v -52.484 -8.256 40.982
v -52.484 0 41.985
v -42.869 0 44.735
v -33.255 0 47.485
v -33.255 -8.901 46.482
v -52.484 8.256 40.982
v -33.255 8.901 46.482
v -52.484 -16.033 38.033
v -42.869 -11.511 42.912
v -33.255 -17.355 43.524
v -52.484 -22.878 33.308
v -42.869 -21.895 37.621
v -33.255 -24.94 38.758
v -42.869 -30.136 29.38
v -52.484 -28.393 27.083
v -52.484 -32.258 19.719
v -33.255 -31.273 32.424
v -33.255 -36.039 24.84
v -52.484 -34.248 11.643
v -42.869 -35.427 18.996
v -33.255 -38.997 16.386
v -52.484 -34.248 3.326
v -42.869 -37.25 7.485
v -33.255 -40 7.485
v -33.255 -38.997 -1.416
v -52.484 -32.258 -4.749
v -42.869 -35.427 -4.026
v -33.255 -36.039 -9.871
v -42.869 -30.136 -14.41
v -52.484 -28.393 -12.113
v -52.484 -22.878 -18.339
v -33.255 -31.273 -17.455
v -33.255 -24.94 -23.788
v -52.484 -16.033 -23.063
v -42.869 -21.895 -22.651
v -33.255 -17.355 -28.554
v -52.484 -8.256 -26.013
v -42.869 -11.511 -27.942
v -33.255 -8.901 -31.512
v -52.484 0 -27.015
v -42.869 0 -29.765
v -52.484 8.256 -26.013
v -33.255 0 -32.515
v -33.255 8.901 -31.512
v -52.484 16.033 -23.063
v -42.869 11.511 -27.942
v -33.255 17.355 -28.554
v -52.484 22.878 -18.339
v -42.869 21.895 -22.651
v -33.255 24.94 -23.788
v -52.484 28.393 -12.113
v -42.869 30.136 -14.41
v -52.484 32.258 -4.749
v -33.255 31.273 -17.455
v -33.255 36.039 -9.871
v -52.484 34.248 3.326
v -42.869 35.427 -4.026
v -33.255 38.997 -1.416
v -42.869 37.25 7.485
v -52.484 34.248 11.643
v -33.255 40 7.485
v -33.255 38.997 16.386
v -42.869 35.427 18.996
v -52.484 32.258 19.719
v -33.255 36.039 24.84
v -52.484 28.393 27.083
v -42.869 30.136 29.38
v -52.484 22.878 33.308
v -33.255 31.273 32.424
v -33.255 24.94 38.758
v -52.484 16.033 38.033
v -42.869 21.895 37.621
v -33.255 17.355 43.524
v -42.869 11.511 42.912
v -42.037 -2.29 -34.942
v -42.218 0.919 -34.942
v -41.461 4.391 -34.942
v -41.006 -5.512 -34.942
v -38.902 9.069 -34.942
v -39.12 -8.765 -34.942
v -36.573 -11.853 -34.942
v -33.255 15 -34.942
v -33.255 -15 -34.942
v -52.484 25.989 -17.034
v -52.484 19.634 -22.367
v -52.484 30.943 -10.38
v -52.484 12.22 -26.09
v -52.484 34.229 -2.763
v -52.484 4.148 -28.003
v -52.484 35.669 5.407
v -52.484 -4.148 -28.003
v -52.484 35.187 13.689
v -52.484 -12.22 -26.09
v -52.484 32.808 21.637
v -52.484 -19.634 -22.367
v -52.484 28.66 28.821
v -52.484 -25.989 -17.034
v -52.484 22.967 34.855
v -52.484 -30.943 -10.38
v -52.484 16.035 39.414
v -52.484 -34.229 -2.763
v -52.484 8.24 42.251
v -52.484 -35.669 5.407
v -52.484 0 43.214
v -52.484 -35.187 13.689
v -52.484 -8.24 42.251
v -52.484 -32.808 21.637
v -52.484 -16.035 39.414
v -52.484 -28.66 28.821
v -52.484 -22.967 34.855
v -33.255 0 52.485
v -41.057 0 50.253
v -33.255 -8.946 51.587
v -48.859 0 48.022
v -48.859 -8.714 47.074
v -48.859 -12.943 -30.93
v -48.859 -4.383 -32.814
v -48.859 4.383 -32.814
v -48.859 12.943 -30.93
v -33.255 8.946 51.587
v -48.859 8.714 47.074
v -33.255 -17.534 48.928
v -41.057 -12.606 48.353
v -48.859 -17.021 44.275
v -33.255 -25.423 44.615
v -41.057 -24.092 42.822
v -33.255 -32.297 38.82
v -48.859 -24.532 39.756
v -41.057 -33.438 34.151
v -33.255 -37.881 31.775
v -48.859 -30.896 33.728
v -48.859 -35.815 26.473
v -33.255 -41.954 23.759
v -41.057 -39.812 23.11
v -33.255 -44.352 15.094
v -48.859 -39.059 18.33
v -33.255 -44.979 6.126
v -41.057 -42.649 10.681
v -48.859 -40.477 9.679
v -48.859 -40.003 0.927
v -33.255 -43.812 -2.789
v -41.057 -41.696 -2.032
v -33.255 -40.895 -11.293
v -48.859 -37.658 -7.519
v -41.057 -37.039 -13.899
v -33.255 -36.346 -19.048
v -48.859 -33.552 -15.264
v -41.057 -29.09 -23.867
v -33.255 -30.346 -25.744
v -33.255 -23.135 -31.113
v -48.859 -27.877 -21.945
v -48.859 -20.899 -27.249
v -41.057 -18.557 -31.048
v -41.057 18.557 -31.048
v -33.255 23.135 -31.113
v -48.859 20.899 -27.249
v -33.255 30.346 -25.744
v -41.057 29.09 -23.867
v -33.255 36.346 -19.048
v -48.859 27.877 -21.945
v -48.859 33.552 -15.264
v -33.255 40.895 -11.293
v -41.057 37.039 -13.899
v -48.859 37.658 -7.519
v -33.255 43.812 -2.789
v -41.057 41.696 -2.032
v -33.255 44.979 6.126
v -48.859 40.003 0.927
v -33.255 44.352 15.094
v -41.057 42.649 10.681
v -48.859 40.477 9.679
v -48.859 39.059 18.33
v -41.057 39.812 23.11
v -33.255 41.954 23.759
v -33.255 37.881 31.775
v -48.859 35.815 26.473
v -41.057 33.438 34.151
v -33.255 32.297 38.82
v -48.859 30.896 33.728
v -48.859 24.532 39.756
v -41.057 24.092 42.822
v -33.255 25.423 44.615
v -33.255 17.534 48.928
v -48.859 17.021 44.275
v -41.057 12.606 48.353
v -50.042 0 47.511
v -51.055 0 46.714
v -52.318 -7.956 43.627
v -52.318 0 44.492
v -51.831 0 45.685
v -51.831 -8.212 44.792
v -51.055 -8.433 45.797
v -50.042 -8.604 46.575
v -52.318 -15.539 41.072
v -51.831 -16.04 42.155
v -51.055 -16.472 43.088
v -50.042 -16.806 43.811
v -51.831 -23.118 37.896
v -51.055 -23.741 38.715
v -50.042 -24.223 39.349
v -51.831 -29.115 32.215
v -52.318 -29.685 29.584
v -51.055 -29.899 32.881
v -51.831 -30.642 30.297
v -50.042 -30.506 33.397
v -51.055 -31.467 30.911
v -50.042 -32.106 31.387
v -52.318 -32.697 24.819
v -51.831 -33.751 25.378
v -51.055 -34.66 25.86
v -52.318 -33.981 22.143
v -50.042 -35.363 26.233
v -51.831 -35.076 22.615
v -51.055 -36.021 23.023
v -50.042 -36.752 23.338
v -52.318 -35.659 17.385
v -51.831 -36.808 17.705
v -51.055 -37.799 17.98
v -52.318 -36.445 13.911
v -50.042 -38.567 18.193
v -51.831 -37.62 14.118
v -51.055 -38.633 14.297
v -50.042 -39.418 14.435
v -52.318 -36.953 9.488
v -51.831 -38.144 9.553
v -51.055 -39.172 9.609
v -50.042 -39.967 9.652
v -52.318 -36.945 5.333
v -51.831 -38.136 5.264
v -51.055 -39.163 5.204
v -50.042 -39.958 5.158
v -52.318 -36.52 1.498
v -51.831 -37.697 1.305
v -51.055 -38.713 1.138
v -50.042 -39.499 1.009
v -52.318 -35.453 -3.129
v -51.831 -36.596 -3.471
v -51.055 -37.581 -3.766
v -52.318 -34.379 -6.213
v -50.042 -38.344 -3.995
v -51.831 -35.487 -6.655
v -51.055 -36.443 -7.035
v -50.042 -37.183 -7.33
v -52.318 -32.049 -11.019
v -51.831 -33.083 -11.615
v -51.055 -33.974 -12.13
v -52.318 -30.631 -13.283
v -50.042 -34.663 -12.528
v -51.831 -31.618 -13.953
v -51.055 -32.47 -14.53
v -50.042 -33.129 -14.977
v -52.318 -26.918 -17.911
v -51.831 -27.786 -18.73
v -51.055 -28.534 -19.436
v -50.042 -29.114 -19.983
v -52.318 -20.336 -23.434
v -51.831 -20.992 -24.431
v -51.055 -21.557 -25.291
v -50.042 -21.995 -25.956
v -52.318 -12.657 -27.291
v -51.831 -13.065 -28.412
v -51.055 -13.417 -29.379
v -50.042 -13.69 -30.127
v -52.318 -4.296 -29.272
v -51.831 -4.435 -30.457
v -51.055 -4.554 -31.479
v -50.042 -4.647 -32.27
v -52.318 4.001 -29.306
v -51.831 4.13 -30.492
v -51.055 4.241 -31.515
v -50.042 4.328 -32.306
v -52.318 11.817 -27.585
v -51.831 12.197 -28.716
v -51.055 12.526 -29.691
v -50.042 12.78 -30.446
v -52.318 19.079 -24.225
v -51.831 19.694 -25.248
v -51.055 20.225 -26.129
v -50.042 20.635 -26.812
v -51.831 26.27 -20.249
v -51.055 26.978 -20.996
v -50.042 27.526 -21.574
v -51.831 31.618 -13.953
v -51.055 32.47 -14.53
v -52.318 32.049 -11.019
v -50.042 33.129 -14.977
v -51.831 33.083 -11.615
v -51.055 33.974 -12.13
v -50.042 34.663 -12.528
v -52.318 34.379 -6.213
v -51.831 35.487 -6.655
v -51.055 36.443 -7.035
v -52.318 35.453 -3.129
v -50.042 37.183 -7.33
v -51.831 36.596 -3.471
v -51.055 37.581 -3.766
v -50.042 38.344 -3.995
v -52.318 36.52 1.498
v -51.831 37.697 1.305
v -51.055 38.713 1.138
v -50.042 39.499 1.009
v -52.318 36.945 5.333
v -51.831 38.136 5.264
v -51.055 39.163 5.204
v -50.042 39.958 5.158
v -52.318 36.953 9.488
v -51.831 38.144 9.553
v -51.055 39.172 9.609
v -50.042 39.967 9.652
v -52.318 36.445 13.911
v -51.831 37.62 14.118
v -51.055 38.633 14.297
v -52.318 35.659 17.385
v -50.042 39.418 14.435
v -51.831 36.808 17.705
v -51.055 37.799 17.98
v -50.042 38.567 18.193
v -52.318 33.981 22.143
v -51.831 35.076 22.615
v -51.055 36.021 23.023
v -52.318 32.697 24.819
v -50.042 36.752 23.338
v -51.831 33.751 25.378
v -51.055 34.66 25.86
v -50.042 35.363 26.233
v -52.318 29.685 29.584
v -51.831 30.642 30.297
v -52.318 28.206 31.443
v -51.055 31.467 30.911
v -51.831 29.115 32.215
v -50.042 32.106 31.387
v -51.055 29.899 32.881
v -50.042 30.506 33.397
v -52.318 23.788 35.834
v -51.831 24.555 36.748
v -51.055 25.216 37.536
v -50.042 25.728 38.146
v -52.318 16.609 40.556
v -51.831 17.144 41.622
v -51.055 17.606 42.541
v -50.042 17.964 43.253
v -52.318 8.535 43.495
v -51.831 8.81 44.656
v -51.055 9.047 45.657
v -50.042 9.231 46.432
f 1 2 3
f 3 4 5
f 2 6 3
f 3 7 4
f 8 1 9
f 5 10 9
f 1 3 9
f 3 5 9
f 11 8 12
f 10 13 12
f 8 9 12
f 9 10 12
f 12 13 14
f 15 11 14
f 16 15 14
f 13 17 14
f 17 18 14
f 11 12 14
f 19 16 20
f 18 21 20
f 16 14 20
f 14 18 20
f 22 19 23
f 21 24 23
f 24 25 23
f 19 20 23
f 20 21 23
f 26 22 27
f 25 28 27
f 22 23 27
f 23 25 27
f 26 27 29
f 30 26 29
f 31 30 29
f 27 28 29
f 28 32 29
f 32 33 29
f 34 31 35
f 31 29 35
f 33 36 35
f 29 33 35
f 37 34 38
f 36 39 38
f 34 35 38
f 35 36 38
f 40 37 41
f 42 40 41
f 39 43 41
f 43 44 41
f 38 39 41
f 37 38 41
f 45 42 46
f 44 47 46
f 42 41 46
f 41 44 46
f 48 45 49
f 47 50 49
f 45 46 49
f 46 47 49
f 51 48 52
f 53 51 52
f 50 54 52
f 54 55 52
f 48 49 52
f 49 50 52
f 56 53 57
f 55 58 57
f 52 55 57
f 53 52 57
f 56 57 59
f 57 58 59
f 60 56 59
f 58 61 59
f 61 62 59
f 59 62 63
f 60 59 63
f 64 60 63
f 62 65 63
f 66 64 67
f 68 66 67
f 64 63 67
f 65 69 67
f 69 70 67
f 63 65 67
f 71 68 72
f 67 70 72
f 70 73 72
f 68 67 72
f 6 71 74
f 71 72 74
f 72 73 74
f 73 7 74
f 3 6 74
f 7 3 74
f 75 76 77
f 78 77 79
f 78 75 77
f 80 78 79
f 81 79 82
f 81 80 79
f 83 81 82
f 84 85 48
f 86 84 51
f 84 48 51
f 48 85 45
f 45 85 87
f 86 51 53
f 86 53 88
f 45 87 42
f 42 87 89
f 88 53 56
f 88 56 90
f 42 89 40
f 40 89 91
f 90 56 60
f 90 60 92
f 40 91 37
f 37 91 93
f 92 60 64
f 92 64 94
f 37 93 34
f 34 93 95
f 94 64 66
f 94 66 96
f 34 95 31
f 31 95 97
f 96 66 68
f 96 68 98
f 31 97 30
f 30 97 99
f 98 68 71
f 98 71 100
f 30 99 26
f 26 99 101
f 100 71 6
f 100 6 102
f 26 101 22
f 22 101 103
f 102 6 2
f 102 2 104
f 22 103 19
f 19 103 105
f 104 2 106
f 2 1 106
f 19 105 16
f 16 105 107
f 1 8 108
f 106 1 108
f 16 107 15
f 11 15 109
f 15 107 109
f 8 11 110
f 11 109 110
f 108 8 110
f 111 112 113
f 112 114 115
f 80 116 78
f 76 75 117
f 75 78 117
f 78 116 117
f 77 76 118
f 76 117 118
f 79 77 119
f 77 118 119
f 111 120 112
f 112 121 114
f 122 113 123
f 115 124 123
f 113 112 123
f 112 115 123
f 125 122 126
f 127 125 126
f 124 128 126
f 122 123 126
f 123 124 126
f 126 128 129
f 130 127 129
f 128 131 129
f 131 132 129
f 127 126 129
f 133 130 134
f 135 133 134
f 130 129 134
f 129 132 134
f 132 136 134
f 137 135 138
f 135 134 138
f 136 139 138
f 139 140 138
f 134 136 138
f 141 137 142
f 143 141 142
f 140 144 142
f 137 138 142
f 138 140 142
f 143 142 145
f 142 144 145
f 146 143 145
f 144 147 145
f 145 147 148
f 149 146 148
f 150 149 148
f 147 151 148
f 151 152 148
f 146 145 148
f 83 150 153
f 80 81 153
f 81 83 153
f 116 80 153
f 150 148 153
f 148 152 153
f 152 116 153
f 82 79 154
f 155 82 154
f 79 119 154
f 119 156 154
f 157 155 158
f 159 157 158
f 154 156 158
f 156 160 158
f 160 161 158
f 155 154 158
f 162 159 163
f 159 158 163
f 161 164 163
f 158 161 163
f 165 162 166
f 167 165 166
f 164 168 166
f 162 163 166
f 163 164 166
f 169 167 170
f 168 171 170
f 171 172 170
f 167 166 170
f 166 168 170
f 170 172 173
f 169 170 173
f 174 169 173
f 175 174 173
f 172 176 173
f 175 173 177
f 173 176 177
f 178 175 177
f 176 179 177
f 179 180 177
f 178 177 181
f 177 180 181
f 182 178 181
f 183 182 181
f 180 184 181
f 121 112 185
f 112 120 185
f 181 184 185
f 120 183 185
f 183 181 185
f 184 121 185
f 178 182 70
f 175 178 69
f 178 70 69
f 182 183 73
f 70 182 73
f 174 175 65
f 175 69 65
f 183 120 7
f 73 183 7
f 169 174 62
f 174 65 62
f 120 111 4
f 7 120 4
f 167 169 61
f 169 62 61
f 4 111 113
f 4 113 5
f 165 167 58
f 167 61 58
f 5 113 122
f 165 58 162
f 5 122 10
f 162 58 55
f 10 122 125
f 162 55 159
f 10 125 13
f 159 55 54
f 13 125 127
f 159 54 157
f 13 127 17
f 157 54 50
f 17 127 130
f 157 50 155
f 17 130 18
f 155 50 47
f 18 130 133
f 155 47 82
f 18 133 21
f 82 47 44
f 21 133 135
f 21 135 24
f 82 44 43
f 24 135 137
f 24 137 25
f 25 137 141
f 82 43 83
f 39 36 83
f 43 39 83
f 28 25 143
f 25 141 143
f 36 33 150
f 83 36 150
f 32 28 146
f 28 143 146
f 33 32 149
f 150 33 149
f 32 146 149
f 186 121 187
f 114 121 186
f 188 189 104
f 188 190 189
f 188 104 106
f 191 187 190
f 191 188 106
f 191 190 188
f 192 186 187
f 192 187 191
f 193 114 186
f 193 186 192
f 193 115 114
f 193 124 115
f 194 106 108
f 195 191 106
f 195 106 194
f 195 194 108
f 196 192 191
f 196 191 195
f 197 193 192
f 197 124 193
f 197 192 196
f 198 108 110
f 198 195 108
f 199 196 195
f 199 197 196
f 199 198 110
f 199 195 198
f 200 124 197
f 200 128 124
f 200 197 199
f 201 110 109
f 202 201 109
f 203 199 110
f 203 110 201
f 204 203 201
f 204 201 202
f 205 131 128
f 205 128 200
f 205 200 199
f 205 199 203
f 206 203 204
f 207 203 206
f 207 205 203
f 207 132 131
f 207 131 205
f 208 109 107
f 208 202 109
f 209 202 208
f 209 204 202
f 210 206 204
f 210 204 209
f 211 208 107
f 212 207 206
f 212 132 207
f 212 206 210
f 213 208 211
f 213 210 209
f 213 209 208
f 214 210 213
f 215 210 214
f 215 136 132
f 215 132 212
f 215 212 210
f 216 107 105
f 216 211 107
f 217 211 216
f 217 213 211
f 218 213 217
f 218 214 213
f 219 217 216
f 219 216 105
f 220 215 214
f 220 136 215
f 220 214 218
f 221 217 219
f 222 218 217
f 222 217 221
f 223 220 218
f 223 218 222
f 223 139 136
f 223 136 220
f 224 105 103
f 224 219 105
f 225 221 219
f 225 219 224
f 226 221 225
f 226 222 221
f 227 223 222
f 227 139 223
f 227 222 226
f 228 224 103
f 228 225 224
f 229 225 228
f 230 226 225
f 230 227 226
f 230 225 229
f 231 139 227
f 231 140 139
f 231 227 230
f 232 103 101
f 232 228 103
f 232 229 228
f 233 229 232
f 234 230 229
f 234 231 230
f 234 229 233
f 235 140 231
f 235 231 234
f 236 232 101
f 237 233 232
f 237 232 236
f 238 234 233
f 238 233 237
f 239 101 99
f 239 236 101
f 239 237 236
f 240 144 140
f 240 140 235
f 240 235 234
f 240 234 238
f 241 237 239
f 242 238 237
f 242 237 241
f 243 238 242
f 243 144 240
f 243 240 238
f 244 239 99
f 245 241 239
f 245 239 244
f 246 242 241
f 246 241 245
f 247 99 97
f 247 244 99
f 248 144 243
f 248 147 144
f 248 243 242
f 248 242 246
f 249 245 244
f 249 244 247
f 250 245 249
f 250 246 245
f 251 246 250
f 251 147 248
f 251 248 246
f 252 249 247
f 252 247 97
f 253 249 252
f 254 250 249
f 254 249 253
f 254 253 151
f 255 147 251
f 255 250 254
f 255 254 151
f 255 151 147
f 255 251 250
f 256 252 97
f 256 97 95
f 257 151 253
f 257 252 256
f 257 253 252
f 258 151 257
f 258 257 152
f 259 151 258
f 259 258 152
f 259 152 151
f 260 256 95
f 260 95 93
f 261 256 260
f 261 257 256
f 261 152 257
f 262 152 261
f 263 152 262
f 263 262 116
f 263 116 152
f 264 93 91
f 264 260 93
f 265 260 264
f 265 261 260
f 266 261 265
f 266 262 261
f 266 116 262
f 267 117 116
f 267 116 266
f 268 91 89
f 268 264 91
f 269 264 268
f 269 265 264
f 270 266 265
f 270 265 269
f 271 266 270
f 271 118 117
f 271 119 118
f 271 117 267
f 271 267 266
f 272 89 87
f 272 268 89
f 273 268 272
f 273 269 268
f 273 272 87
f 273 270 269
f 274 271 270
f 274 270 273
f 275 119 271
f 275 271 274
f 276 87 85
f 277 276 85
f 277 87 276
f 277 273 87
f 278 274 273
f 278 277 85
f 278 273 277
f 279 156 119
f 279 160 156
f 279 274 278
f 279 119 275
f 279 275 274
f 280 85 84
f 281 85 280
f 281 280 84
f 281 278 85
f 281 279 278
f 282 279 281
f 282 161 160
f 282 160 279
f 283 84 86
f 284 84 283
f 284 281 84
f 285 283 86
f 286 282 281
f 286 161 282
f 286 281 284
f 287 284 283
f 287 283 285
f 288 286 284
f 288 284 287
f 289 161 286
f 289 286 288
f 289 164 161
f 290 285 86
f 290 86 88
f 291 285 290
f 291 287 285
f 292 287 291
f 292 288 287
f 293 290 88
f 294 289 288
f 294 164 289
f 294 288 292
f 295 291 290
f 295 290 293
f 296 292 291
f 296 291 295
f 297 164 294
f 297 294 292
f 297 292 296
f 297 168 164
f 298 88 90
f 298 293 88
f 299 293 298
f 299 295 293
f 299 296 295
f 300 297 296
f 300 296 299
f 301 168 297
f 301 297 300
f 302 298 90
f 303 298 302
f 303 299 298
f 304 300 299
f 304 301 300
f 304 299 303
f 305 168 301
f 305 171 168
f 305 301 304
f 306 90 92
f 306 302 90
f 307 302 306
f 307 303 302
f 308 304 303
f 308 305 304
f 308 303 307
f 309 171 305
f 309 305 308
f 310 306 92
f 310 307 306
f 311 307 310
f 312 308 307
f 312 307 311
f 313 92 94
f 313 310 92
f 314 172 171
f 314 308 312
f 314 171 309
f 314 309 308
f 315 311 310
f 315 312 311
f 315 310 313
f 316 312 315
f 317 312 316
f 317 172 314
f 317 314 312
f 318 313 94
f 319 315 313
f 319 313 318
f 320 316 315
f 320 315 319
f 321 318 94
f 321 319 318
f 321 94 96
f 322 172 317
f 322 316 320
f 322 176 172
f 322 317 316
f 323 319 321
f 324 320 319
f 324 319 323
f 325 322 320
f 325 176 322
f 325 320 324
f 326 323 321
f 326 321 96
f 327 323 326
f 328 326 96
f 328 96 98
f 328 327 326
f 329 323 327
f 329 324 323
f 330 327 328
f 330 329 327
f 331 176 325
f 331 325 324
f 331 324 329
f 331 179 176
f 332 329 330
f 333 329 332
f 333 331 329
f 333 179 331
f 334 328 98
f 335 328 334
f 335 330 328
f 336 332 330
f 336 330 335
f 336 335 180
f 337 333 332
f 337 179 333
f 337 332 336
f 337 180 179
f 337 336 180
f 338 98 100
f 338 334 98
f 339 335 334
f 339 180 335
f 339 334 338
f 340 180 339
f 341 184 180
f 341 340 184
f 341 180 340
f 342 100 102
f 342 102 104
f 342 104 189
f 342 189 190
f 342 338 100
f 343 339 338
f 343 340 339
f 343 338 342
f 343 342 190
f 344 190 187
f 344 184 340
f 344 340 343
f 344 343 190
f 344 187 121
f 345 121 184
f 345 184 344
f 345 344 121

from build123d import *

# Parameters (mm, degrees)
F2_W     = 50
F2_H     = 12.9609592259
F3_DEPTH = 35.1
F4_R     = 5


# Not quite as in the source:
# - a feature names something its author has since deleted; it is built from what else it names


with BuildPart() as f1:
    # F0 (on Front) → F1 (revolve)
    with BuildSketch(Plane.XZ):
        Polygon((-52.483901754, 46.9848437961), (-52.483901754, 41.9848437961), (-33.255017231, 47.4848437961), (-33.255017231, 52.4848437961), align=None)
    revolve(axis=Axis((-42.8694594925, 0, 7.4848437961), (1, 0, 0)))

    # F2 (on Front) → F3 (cut, symmetric)
    with BuildSketch(Plane.XZ):
        with Locations((-24.5732873678, -41.422042688)):
            Rectangle(F2_W, F2_H)
    extrude(amount=F3_DEPTH, both=True, mode=Mode.SUBTRACT)

    # F4
    f4_edges = [f1.edges().sort_by_distance(p)[0] for p in [
        (-52.483902, 0, -32.015156),
    ]]
    fillet(f4_edges, radius=F4_R)


solid = f1.part
